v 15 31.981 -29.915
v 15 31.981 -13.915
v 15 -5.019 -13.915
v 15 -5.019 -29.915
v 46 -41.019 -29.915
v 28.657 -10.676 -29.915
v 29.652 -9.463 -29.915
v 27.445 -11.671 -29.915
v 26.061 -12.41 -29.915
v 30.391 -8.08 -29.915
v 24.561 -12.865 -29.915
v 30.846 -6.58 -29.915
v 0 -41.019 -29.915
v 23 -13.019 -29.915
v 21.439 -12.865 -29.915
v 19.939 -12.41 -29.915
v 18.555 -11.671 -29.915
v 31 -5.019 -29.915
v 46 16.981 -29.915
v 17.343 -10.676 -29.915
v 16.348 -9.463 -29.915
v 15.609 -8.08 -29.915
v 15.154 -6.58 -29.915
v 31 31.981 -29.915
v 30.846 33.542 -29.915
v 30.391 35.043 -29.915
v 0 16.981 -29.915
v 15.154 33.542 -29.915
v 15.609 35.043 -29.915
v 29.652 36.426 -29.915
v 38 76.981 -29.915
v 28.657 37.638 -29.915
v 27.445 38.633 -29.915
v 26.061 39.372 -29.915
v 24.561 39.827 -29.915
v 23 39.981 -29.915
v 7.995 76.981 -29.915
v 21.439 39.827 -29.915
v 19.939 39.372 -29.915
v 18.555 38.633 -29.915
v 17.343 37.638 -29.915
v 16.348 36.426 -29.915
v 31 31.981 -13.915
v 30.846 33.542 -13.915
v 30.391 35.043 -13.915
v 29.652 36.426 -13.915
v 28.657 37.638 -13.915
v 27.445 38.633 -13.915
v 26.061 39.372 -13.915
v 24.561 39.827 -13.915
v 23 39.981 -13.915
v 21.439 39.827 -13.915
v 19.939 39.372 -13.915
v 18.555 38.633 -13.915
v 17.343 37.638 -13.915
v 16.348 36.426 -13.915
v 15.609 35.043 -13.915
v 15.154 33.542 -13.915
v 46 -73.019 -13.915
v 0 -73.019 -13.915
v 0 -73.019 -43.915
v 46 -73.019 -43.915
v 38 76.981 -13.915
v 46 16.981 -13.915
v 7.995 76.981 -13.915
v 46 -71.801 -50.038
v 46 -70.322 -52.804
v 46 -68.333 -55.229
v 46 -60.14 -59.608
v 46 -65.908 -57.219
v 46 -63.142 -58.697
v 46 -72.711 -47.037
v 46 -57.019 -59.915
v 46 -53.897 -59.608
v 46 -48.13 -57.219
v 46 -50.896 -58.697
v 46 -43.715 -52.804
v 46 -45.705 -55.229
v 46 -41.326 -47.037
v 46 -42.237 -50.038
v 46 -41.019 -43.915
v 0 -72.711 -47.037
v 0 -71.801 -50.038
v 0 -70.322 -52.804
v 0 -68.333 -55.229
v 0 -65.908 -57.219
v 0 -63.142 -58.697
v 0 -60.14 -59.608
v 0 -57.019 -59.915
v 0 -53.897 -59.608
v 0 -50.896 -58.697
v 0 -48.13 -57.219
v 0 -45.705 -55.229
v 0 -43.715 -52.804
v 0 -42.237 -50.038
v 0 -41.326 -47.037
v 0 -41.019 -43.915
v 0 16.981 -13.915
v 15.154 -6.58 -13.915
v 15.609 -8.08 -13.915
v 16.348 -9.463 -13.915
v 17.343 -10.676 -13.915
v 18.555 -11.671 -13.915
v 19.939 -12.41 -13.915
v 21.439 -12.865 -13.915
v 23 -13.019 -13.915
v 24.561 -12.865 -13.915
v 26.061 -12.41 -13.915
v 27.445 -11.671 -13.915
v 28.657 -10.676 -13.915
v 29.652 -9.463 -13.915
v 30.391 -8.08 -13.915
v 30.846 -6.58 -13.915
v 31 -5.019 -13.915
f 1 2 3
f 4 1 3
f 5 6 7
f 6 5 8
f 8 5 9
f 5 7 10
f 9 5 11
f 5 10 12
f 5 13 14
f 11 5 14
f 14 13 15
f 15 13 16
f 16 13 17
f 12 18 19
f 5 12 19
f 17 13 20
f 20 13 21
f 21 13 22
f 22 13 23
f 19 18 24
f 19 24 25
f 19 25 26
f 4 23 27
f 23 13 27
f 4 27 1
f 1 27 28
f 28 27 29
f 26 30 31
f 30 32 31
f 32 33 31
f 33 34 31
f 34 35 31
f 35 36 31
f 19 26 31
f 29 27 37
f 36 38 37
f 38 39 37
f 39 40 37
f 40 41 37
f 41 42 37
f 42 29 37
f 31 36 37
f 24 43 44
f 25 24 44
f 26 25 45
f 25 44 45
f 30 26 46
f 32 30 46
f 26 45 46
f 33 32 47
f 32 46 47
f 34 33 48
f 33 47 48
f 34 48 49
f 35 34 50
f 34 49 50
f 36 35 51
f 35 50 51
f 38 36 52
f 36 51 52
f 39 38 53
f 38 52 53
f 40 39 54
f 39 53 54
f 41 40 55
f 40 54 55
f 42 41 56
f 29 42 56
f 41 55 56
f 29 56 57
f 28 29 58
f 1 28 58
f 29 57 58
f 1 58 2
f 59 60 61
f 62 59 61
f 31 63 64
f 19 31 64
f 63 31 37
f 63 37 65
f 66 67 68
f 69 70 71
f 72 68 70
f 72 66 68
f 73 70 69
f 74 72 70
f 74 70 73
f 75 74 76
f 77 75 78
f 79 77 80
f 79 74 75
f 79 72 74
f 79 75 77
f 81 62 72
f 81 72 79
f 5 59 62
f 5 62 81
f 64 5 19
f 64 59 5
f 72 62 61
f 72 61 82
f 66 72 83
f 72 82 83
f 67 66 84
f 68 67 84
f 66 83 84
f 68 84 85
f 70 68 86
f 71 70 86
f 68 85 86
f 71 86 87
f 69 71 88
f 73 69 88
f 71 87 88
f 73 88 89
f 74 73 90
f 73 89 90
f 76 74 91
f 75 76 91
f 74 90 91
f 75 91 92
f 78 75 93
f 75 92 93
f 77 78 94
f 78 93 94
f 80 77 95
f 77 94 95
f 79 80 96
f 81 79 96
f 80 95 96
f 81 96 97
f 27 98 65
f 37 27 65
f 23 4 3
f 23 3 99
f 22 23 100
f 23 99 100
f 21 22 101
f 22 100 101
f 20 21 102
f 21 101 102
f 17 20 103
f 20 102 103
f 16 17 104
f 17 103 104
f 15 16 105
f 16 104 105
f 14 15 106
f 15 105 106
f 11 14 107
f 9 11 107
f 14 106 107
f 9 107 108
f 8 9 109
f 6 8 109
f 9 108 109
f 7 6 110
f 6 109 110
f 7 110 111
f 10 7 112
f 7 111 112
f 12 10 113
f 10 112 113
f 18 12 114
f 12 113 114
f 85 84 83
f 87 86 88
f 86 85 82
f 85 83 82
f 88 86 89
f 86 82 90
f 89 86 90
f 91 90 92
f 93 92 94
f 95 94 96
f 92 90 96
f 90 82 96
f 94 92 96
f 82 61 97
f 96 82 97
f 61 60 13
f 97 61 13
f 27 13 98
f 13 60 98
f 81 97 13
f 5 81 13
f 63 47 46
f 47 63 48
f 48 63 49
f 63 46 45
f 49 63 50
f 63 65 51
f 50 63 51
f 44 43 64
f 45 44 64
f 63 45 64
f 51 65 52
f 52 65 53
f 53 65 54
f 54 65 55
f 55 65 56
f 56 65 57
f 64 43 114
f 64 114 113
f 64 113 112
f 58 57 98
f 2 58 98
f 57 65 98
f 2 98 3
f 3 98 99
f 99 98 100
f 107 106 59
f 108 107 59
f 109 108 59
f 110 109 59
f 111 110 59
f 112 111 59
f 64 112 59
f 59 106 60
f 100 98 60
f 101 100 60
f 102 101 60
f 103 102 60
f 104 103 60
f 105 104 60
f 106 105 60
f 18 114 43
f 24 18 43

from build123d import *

# Parameters (mm, degrees)
F1_DEPTH = 46
F3_DEPTH = 25
F5_DEPTH = 25


with BuildPart() as f1:
    # F0 (on Right) → F1 (new body)
    with BuildSketch(Plane.YZ):
        with BuildLine():
            Line((76.981132, -29.915097), (76.981132, -13.915097))
            Line((76.981132, -13.915097), (-41.018868, -13.915097))
            Line((-41.018868, -13.915097), (-73.018868, -13.915097))
            Line((-73.018868, -13.915097), (-73.018868, -29.915097))
            Line((-73.018868, -29.915097), (-73.018868, -43.915097))
            ThreePointArc((-73.018868, -43.915097), (-57.018868, -59.915097), (-41.018868, -43.915097))
            Line((-41.018868, -43.915097), (-41.018868, -29.915097))
            Line((-41.018868, -29.915097), (76.981132, -29.915097))
        make_face()
    extrude(amount=F1_DEPTH)

    # F2 (on face) → F3 (cut)
    with BuildSketch(Plane.XY.offset(-13.915097)):
        Polygon((46, 76.981132), (38, 76.981132), (46, 16.981132), align=None)
        Polygon((0, 16.981132), (7.994875, 76.981132), (0, 76.981132), align=None)
    extrude(amount=-F3_DEPTH, mode=Mode.SUBTRACT)

    # F4 (on face) → F5 (cut)
    with BuildSketch(Plane.XY.offset(-13.915097)):
        with BuildLine():
            ThreePointArc((31, 31.981132), (23, 39.981132), (15, 31.981132))
            Line((15, 31.981132), (15, -5.018868))
            ThreePointArc((15, -5.018868), (23, -13.018868), (31, -5.018868))
            Line((31, -5.018868), (31, 31.981132))
        make_face()
    extrude(amount=-F5_DEPTH, mode=Mode.SUBTRACT)


solid = f1.part
